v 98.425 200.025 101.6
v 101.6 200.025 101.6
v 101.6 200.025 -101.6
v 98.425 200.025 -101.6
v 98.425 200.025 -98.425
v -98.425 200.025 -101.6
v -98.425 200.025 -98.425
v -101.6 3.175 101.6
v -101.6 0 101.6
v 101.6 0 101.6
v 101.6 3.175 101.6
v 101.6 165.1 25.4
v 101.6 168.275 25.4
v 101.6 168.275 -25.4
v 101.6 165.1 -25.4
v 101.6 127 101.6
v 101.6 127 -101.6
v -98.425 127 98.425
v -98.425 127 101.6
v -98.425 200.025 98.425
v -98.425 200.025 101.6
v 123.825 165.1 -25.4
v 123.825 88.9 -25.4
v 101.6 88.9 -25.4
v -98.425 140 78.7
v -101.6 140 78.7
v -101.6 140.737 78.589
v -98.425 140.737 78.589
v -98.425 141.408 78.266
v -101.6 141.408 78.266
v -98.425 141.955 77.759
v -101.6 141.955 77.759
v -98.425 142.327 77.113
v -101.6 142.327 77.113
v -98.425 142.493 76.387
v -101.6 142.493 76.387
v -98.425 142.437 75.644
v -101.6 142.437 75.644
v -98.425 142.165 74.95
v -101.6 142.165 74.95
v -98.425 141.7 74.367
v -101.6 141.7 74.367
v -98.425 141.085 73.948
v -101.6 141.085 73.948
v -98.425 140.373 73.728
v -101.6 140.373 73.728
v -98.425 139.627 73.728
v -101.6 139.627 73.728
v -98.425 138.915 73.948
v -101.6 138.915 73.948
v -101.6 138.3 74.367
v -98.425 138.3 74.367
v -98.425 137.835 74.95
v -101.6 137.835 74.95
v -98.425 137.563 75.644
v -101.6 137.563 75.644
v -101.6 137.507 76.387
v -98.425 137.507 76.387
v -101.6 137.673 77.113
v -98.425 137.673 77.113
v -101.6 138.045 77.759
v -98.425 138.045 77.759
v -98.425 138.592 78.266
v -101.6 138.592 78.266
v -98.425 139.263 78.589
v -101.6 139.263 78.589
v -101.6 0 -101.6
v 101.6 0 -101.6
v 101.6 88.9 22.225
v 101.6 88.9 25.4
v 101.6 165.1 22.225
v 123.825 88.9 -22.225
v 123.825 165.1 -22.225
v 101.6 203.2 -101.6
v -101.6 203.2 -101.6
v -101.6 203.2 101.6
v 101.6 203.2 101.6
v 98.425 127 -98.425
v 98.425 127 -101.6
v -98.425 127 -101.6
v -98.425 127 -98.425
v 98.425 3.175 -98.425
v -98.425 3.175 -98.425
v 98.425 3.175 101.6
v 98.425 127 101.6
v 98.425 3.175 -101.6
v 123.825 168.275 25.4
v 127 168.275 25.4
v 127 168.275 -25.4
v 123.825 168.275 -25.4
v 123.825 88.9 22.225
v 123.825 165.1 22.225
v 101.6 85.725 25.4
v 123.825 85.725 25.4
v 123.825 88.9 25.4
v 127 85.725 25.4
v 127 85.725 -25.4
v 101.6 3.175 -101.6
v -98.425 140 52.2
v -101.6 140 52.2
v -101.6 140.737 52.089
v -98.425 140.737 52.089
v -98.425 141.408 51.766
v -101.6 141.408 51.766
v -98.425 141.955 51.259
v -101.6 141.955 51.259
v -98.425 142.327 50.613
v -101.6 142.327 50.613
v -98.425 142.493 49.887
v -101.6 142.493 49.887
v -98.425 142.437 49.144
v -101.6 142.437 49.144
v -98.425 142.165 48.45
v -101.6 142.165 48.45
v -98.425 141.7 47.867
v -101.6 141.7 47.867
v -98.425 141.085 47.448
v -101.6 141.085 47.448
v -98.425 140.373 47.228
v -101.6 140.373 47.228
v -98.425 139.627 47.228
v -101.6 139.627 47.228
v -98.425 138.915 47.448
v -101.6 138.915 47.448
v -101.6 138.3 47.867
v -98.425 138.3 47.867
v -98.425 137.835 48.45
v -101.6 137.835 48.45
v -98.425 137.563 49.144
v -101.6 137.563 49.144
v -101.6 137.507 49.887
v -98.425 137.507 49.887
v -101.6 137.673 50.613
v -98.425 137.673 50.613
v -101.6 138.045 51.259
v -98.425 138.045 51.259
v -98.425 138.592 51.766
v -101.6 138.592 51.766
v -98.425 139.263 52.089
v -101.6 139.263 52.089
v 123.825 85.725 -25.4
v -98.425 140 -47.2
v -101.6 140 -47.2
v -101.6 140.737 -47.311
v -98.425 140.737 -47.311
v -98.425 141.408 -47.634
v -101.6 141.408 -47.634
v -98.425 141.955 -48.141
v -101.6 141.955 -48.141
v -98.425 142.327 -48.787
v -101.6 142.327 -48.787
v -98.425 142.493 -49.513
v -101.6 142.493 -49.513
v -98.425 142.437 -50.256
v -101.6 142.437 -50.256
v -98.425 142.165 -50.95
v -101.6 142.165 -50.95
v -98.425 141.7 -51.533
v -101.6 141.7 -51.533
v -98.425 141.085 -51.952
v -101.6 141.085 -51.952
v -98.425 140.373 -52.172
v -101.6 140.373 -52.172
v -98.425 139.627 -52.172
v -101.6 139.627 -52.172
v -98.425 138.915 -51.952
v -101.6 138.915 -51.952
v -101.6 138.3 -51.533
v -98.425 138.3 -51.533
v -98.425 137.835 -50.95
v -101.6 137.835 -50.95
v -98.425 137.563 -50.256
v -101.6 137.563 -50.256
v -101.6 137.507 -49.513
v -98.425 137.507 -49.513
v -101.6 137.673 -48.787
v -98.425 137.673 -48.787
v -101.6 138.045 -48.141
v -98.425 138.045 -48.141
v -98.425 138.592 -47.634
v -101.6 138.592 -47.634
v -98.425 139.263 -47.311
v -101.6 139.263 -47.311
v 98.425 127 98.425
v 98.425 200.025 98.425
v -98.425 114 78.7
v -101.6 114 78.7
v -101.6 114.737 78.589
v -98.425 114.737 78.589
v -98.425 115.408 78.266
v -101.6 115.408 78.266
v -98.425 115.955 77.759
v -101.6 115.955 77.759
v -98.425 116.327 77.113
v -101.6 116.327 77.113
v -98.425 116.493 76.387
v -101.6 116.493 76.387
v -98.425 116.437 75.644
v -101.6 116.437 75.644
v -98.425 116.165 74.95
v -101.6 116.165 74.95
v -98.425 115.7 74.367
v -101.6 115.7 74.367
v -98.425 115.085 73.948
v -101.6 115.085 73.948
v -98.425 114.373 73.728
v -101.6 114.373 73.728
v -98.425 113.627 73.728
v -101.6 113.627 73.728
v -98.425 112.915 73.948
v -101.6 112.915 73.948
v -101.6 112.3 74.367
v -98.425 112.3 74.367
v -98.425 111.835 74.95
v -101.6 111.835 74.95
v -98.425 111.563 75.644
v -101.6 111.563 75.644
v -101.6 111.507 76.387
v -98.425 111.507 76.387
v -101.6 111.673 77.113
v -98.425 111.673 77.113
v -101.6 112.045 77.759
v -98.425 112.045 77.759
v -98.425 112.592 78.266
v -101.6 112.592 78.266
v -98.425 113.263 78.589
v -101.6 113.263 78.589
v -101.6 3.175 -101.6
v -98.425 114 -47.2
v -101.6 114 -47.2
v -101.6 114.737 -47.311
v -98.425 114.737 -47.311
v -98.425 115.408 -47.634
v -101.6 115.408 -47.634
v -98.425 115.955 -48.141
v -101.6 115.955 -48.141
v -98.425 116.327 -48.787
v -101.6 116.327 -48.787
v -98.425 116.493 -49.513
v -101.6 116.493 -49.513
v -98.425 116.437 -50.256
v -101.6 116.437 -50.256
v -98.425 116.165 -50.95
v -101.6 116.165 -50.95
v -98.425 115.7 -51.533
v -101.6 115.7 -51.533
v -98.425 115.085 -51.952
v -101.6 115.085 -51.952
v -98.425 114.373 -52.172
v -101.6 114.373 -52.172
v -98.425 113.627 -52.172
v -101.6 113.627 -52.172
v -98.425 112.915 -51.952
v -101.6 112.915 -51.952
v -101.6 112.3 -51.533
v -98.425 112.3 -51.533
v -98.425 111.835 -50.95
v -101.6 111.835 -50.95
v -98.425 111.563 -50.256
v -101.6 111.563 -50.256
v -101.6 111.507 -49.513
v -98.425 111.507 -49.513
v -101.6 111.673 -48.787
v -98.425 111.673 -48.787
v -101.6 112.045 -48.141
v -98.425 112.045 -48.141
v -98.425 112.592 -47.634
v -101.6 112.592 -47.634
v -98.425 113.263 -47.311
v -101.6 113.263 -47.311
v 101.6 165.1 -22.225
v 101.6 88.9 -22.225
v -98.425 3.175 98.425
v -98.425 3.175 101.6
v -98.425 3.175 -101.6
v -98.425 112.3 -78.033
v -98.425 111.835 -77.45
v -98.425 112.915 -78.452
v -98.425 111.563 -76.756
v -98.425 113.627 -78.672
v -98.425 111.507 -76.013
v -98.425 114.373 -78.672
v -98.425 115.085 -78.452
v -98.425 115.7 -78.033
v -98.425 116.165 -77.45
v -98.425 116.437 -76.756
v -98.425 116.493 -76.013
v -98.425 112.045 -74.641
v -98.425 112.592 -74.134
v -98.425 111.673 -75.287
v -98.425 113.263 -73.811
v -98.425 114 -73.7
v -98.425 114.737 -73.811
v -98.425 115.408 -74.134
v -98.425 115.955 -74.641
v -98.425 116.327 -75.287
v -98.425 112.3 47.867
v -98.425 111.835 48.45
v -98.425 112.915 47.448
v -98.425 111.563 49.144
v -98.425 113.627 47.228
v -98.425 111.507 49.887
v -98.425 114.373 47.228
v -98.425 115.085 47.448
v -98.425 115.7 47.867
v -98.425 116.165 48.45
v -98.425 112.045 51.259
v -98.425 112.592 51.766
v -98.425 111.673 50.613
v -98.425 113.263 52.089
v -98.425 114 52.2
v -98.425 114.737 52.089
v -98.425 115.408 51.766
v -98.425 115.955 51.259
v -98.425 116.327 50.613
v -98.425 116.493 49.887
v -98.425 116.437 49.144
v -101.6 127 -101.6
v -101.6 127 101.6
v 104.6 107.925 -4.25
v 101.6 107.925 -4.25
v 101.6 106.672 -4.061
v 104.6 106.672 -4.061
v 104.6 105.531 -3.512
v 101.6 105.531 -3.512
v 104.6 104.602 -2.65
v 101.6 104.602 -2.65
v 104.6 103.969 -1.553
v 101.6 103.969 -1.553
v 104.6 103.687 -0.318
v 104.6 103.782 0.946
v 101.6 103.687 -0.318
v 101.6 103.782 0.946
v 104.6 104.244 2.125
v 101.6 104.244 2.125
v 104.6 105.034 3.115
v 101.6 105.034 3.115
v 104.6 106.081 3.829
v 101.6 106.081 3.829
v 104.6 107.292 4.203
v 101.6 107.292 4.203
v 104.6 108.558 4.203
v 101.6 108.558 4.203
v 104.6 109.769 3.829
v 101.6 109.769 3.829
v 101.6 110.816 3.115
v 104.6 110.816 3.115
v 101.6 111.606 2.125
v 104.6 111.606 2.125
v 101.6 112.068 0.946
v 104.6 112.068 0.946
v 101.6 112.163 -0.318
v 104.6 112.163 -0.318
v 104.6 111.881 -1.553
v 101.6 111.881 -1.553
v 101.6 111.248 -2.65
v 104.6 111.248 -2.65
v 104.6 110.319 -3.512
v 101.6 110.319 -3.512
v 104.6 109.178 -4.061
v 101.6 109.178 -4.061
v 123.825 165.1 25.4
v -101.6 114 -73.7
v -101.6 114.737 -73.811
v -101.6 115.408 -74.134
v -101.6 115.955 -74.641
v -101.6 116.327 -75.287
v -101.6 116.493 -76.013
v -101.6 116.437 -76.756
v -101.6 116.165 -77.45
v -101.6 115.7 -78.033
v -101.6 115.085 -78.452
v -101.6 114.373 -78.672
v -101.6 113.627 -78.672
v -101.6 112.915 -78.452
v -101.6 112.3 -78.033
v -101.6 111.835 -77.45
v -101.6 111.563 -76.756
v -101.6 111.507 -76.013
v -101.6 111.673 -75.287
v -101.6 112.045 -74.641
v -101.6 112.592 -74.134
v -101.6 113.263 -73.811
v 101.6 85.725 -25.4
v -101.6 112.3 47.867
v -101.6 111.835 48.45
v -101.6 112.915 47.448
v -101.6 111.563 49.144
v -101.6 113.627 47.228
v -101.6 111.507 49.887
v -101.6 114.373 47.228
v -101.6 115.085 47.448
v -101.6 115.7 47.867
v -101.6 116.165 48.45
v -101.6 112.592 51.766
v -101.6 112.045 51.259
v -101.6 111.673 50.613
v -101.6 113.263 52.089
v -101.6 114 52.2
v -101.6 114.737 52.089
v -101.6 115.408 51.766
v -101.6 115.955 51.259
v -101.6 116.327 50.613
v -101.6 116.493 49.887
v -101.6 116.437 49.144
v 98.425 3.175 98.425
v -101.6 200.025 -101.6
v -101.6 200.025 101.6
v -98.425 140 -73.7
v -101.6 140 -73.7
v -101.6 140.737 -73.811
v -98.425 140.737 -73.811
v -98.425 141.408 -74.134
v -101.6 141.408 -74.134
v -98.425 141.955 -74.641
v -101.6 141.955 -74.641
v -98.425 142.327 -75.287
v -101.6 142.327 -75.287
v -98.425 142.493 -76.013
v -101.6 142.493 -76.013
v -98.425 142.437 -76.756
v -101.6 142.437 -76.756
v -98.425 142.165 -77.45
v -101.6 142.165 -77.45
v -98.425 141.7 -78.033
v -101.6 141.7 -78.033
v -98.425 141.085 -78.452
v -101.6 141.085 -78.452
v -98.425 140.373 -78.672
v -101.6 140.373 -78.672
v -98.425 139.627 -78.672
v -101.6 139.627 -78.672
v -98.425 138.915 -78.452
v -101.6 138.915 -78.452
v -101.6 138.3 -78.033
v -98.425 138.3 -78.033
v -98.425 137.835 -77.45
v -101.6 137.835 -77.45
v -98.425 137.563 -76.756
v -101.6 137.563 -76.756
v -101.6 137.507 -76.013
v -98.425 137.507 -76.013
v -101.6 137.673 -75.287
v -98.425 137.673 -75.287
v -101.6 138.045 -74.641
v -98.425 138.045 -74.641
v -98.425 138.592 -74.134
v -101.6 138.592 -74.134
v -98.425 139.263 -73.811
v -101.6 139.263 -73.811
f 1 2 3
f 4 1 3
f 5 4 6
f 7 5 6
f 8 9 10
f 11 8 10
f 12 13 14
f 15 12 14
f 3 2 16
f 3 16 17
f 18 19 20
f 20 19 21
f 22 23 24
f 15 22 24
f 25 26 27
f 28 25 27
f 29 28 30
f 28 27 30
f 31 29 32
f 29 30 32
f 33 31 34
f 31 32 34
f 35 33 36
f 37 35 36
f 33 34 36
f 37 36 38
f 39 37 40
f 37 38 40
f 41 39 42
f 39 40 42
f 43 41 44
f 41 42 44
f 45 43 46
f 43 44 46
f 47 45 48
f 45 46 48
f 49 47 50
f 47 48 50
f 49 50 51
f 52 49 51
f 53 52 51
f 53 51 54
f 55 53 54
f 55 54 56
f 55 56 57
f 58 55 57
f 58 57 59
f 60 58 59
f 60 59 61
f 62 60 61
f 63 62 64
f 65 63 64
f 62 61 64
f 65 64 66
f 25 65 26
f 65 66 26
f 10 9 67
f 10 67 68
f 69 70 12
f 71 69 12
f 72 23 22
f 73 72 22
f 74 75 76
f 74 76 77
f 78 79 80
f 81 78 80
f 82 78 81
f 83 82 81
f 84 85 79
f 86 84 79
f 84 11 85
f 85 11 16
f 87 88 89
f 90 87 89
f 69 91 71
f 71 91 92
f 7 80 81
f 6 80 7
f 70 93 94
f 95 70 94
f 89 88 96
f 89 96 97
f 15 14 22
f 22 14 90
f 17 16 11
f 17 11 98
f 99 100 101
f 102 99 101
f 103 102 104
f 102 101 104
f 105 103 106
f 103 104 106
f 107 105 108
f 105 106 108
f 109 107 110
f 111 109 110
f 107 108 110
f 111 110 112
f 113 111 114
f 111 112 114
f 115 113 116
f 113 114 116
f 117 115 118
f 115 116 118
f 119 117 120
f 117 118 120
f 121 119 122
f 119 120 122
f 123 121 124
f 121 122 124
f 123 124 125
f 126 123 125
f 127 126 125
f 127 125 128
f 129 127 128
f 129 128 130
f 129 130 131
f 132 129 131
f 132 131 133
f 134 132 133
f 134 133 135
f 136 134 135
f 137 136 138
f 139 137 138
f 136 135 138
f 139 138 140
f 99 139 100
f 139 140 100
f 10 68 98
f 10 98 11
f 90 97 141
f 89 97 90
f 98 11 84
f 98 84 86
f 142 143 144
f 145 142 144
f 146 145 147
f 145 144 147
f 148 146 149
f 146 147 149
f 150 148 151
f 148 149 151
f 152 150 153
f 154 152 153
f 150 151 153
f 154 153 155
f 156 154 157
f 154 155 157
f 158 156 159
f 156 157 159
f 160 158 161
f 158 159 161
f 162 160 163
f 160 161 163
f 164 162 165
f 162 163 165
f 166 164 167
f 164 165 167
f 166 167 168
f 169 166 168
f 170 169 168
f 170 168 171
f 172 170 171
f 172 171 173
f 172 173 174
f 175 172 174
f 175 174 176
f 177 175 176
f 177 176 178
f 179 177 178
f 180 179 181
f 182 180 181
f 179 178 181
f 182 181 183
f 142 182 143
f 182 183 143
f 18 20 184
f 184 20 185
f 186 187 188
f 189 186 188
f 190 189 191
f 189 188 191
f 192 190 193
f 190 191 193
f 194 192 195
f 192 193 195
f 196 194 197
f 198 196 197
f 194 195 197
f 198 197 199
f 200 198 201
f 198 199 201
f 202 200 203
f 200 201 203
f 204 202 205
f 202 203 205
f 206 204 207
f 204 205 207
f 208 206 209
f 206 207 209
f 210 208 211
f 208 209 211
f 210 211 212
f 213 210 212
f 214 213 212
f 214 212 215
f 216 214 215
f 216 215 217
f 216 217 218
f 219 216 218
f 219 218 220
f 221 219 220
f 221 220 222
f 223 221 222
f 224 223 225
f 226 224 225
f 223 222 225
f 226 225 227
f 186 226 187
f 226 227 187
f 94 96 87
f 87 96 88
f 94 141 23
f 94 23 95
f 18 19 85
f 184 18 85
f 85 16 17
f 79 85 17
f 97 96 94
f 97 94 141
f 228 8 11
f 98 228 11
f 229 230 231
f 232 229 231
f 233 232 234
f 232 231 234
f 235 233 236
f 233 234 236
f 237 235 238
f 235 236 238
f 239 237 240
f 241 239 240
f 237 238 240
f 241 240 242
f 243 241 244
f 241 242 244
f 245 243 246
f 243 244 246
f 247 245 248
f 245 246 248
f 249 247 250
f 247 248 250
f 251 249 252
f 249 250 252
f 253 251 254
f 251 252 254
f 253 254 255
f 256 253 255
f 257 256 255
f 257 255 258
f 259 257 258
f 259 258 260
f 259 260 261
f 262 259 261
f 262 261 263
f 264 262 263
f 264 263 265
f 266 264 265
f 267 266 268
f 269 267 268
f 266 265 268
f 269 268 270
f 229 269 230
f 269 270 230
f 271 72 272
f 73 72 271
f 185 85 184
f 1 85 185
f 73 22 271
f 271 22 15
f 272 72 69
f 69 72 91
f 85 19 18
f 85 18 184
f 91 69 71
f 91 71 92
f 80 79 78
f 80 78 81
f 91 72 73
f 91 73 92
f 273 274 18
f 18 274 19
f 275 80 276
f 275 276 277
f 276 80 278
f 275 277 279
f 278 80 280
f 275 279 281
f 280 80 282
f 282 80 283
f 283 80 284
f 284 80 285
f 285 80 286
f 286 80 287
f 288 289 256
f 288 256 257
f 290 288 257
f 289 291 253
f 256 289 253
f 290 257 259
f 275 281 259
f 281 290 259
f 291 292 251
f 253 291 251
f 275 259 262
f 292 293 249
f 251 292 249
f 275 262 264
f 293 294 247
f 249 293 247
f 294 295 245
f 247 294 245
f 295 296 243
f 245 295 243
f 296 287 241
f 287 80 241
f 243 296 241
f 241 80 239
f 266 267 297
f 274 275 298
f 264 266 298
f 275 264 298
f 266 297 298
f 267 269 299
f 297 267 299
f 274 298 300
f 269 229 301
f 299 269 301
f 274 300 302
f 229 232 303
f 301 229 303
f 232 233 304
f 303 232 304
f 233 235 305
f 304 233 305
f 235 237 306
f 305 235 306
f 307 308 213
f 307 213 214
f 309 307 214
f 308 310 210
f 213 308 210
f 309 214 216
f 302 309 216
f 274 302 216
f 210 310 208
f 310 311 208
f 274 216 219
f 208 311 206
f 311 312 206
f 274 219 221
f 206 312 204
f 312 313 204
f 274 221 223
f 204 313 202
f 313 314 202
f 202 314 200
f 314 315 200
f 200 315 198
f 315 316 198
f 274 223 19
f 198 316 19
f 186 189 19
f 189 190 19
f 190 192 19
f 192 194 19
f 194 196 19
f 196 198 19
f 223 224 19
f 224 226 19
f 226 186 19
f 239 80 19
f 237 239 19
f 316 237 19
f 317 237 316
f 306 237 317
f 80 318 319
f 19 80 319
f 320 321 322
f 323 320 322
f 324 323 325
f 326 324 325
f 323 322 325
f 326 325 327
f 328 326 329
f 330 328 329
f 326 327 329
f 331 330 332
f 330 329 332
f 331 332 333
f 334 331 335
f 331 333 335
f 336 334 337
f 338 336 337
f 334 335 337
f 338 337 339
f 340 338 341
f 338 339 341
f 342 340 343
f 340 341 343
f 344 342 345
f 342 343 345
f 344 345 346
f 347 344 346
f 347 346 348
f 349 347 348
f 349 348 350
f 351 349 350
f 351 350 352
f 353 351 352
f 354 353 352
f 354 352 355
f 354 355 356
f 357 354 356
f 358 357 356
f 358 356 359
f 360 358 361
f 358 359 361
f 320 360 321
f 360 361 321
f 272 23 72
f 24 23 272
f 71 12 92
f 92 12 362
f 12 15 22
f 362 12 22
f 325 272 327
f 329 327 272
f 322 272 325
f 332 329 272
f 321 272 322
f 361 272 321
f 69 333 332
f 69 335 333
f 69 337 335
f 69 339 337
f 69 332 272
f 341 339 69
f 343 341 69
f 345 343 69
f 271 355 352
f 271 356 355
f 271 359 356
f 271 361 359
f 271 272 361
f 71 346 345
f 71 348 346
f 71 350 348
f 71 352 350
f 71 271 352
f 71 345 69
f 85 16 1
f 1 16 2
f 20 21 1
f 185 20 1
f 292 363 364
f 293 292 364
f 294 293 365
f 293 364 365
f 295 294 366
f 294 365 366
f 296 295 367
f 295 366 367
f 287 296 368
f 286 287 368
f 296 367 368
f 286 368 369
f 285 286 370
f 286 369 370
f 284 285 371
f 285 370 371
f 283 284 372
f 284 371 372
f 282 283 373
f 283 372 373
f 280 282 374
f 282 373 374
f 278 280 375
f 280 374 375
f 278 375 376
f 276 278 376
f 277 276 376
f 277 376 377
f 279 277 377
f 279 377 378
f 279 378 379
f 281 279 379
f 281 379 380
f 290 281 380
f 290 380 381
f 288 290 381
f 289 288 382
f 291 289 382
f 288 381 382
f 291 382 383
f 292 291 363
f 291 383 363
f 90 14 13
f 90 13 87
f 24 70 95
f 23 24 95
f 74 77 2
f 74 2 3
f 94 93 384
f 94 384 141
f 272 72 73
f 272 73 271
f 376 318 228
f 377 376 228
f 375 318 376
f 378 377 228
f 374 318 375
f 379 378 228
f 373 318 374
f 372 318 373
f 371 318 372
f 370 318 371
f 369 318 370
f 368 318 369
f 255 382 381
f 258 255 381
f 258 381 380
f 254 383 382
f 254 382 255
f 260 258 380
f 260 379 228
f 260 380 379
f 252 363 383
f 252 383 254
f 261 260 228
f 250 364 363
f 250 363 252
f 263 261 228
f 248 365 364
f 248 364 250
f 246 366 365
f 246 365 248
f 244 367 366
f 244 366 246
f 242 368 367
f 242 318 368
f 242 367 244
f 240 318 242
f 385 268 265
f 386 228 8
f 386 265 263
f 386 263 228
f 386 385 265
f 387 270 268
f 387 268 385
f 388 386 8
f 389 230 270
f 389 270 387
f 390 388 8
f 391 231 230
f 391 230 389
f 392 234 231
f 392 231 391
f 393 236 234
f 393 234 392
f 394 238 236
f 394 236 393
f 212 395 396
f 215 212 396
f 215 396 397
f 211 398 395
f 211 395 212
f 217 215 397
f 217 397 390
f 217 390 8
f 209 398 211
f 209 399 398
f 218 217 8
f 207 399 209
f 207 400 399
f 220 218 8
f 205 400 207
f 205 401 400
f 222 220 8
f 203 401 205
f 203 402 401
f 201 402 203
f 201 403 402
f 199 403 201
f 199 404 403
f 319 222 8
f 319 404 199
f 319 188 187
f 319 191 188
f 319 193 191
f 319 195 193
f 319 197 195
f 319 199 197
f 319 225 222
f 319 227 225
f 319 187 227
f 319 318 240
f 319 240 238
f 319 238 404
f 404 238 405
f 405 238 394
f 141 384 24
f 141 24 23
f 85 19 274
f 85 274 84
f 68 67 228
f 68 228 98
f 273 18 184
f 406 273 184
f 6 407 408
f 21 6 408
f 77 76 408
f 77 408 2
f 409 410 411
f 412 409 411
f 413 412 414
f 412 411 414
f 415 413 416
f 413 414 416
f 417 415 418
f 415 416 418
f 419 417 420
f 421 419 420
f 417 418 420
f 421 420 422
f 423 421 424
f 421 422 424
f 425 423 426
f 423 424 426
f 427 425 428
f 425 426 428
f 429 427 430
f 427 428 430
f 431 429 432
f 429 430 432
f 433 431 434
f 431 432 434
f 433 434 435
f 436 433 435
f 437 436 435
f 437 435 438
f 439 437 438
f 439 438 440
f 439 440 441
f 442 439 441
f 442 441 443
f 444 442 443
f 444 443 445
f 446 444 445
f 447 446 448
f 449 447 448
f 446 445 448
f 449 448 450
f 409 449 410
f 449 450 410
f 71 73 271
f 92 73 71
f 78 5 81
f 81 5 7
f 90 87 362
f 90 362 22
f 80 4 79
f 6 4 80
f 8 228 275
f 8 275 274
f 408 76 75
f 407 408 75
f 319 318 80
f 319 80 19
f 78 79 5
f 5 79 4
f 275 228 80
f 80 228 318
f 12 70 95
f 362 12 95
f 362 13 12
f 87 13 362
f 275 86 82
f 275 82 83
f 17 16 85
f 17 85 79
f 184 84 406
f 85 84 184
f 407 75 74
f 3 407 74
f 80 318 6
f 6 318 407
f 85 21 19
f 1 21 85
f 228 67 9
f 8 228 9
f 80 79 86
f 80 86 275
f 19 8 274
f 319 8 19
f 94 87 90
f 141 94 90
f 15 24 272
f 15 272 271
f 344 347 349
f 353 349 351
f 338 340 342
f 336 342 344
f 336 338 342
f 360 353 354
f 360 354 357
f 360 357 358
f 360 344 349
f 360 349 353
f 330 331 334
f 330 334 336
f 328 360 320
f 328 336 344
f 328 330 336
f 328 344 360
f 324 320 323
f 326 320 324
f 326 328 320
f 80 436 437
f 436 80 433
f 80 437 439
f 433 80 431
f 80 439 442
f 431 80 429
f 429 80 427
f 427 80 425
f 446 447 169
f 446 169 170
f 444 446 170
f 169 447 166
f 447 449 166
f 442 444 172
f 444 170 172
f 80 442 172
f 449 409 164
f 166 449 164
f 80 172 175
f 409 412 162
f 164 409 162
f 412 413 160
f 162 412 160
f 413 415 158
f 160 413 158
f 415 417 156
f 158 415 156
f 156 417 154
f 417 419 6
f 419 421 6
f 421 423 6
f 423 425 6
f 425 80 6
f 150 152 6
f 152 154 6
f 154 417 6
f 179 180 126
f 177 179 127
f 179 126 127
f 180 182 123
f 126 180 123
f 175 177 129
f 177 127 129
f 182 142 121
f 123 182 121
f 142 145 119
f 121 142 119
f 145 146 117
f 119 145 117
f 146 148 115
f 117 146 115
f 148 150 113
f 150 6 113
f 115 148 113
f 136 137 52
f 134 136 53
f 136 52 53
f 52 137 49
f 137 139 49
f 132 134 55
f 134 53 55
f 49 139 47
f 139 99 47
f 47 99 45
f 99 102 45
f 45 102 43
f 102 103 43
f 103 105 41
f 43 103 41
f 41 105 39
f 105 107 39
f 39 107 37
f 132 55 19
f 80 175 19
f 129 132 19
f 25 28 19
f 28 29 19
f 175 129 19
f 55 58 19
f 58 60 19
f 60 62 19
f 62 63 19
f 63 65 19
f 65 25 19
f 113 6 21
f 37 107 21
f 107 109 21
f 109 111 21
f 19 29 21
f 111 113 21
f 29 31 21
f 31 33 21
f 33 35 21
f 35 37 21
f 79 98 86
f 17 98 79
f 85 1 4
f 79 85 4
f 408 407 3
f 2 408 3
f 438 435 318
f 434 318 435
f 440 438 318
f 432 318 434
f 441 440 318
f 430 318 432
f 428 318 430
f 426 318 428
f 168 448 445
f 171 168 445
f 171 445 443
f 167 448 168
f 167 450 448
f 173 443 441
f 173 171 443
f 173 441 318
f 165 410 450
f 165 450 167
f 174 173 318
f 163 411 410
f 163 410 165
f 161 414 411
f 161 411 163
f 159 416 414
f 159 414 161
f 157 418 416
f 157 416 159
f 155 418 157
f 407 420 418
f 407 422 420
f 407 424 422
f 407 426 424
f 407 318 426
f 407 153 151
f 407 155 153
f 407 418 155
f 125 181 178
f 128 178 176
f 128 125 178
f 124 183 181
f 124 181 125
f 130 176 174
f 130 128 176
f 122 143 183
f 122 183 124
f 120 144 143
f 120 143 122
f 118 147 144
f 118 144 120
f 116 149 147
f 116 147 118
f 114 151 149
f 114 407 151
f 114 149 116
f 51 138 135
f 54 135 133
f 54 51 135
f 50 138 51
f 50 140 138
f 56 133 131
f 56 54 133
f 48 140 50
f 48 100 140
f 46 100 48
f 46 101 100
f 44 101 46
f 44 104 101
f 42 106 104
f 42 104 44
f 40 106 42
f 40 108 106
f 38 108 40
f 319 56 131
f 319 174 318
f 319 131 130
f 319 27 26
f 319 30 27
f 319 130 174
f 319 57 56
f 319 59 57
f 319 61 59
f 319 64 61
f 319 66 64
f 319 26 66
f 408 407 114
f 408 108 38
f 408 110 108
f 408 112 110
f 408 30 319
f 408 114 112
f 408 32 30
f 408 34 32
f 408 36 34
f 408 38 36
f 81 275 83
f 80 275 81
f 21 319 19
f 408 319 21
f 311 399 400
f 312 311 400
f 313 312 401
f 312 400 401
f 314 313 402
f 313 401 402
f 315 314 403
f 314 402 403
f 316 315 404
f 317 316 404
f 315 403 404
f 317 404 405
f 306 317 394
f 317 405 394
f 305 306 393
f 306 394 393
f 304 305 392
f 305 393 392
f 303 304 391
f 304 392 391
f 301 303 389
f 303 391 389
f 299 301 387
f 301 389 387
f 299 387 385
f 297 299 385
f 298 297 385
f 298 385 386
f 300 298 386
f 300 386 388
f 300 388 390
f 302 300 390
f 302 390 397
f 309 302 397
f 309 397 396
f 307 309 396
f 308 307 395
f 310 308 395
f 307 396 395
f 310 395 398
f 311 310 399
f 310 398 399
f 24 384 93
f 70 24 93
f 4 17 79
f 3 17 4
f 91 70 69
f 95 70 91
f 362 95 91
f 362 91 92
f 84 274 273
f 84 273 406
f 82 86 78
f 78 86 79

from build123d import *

# Parameters (mm, degrees)
SKETCH1_W            = 203.2
SKETCH1_H            = 203.2
BOSS_EXTRUDE1_DEPTH  = 127
SKETCH2_W            = 190.5
SKETCH2_H            = 190.5
CUT_EXTRUDE1_DEPTH   = 120.65
SKETCH3_W            = 203.2
SKETCH3_H            = 203.2
BOSS_EXTRUDE2_DEPTH  = 76.2
CUT_EXTRUDE2_START   = -6.35
SKETCH5_W            = 190.5
SKETCH5_H            = 190.5
CUT_EXTRUDE2_DEPTH   = 69.85
BOSS_EXTRUDE3_START  = 101.6
SKETCH6_W            = 50.8
SKETCH6_H            = 82.55
BOSS_EXTRUDE3_DEPTH  = 25.4
SKETCH7_R            = 2.499999953
CUT_EXTRUDE3_DEPTH   = 6.35
SKETCH9_W            = 38.1
SKETCH9_H            = 69.85
CUT_EXTRUDE4_DEPTH   = 19.05
BOSS_EXTRUDE4_START  = -3.175
SKETCH10_W           = 44.45
SKETCH10_H           = 76.2
BOSS_EXTRUDE4_DEPTH  = 22.225
SKETCH15_W           = 50.8
SKETCH15_H           = 82.55
BOSS_EXTRUDE5_DEPTH  = 3.175
SKETCH16_W           = 22.225
SKETCH16_H           = 50.8
BOSS_EXTRUDE7_DEPTH  = 3.175
SKETCH18_W           = 22.225
SKETCH18_H           = 50.8
BOSS_EXTRUDE8_DEPTH  = 3.175
SKETCH13_R           = 4.25
CUT_EXTRUDE6_DEPTH   = 3
SKETCH21_W           = 22.225
SKETCH21_H           = 76.2
BOSS_EXTRUDE13_DEPTH = 3.175
SKETCH22_W           = 203.2
SKETCH22_H           = 203.2
BOSS_EXTRUDE14_DEPTH = 3.175
SKETCH23_W           = 203.2
SKETCH23_H           = 73.025
BOSS_EXTRUDE16_DEPTH = 3.175
SKETCH24_W           = 203.2
SKETCH24_H           = 73.025
SKETCH24_R           = 2.499999953
BOSS_EXTRUDE17_DEPTH = 3.175
SKETCH25_W           = 196.85
SKETCH25_H           = 73.025
BOSS_EXTRUDE18_DEPTH = 3.175
SKETCH26_W           = 196.85
SKETCH26_H           = 73.025
BOSS_EXTRUDE19_DEPTH = 3.175
SKETCH27_W           = 203.2
SKETCH27_H           = 203.2
BOSS_EXTRUDE20_DEPTH = 3.175
SKETCH28_W           = 203.2
SKETCH28_H           = 123.825
BOSS_EXTRUDE21_DEPTH = 3.175
SKETCH29_W           = 203.2
SKETCH29_H           = 123.825
SKETCH29_R           = 2.499999953
BOSS_EXTRUDE22_DEPTH = 3.175
SKETCH30_W           = 196.85
SKETCH30_H           = 123.825
BOSS_EXTRUDE23_DEPTH = 3.175
SKETCH31_W           = 196.85
SKETCH31_H           = 123.825
BOSS_EXTRUDE24_DEPTH = 3.175
SKETCH19_W           = 22.225
SKETCH19_H           = 76.2
BOSS_EXTRUDE26_DEPTH = 3.175


with BuildPart() as part:
    # Sketch1 → Boss-Extrude1 (new body)
    with BuildSketch(Plane(origin=(0, 0, 0), x_dir=(1, 0, 0), z_dir=(0, 1, 0))):
        Rectangle(SKETCH1_W, SKETCH1_H)
    extrude(amount=BOSS_EXTRUDE1_DEPTH)

    # Sketch2 → Cut-Extrude1 (cut)
    with BuildSketch(Plane(origin=(0, 127, 0), x_dir=(1, 0, 0), z_dir=(0, 1, 0))):
        Rectangle(SKETCH2_W, SKETCH2_H)
    extrude(amount=-CUT_EXTRUDE1_DEPTH, mode=Mode.SUBTRACT)


with BuildPart() as body_2:
    # Sketch3 → Boss-Extrude2 (new body)
    with BuildSketch(Plane(origin=(0, 127, 0), x_dir=(1, 0, 0), z_dir=(0, 1, 0))):
        Rectangle(SKETCH3_W, SKETCH3_H)
    extrude(amount=BOSS_EXTRUDE2_DEPTH)

    # Sketch5 → Cut-Extrude2 (cut)
    with BuildSketch(Plane(origin=(0, 203.2, 0), x_dir=(1, 0, 0), z_dir=(0, 1, 0)).offset(CUT_EXTRUDE2_START)):
        Rectangle(SKETCH5_W, SKETCH5_H)
    extrude(amount=-CUT_EXTRUDE2_DEPTH, mode=Mode.SUBTRACT)

    # Sketch7 → Cut-Extrude3 (cut)
    with BuildSketch(Plane.ZY.offset(101.6)):
        with Locations((-76.2, 139.999999908)):
            Circle(SKETCH7_R)
        with Locations((-49.699999914, 139.999999908)):
            Circle(SKETCH7_R)
        with Locations((49.699999914, 139.999999908)):
            Circle(SKETCH7_R)
        with Locations((76.2, 139.999999908)):
            Circle(SKETCH7_R)
    cut_extrude3 = extrude(amount=-CUT_EXTRUDE3_DEPTH, mode=Mode.SUBTRACT)


with BuildPart() as body_3:
    # Sketch6 → Boss-Extrude3 (new body)
    with BuildSketch(Plane(origin=(0, 0, 0), x_dir=(0, 0, -1), z_dir=(1, 0, 0)).offset(BOSS_EXTRUDE3_START)):
        with Locations((0, 127)):
            Rectangle(SKETCH6_W, SKETCH6_H)
    extrude(amount=BOSS_EXTRUDE3_DEPTH)

    # Sketch9 → Cut-Extrude4 (cut)
    with BuildSketch(Plane.ZY.offset(-101.6)):
        with Locations((0, 127)):
            Rectangle(SKETCH9_W, SKETCH9_H)
    extrude(amount=-CUT_EXTRUDE4_DEPTH, mode=Mode.SUBTRACT)


with BuildPart() as part_1:
    add(part.part)

    # Mirror4: Cut-Extrude3 across plane
    add(cut_extrude3.mirror(Plane(origin=(0, 127, 0), x_dir=(0, 0, 1), z_dir=(0, -1, 0))), mode=Mode.SUBTRACT)


with BuildPart() as body_4:
    # Sketch10 → Boss-Extrude4 (new body)
    with BuildSketch(Plane.ZY.offset(-120.65).offset(BOSS_EXTRUDE4_START)):
        with Locations((0, 127)):
            Rectangle(SKETCH10_W, SKETCH10_H)
    extrude(amount=BOSS_EXTRUDE4_DEPTH)

    # Sketch13 → Cut-Extrude6 (cut)
    with BuildSketch(Plane.ZY.offset(-101.6)):
        with Locations(Location((0, 107.925, 0), (0, 0, 180))):
            Circle(SKETCH13_R)
    extrude(amount=-CUT_EXTRUDE6_DEPTH, mode=Mode.SUBTRACT)


with BuildPart() as body_5:
    # Sketch15 → Boss-Extrude5 (new body)
    with BuildSketch(Plane(origin=(127, 0, 0), x_dir=(0, 0, -1), z_dir=(1, 0, 0))):
        with Locations((0, 127)):
            Rectangle(SKETCH15_W, SKETCH15_H)
    extrude(amount=-BOSS_EXTRUDE5_DEPTH)


with BuildPart() as body_6:
    # Sketch16 → Boss-Extrude7 (new body)
    with BuildSketch(Plane(origin=(0, 168.275, 0), x_dir=(1, 0, 0), z_dir=(0, 1, 0))):
        with Locations((112.7125, 0)):
            Rectangle(SKETCH16_W, SKETCH16_H)
    extrude(amount=-BOSS_EXTRUDE7_DEPTH)


with BuildPart() as body_7:
    # Sketch18 → Boss-Extrude8 (new body)
    with BuildSketch(Plane.XZ.offset(-85.725)):
        with Locations((112.7125, 0)):
            Rectangle(SKETCH18_W, SKETCH18_H)
    extrude(amount=-BOSS_EXTRUDE8_DEPTH)


with BuildPart() as body_8:
    # Sketch21 → Boss-Extrude13 (new body)
    with BuildSketch(Plane(origin=(0, 0, -25.4), x_dir=(-1, 0, 0), z_dir=(0, 0, -1))):
        with Locations((-112.7125, 127)):
            Rectangle(SKETCH21_W, SKETCH21_H)
    extrude(amount=-BOSS_EXTRUDE13_DEPTH)


with BuildPart() as body_8_2:
    # Sketch22 → Boss-Extrude14 (new body)
    with BuildSketch(Plane(origin=(0, 203.2, 0), x_dir=(1, 0, 0), z_dir=(0, 1, 0))):
        Rectangle(SKETCH22_W, SKETCH22_H)
    extrude(amount=-BOSS_EXTRUDE14_DEPTH)


with BuildPart() as body_9:
    # Sketch23 → Boss-Extrude16 (new body)
    with BuildSketch(Plane(origin=(101.6, 0, 0), x_dir=(0, 0, -1), z_dir=(1, 0, 0))):
        with Locations((0, 163.5125)):
            Rectangle(SKETCH23_W, SKETCH23_H)
    extrude(amount=-BOSS_EXTRUDE16_DEPTH)


with BuildPart() as body_10:
    # Sketch24 → Boss-Extrude17 (new body)
    with BuildSketch(Plane.ZY.offset(101.6)):
        with Locations((0, 163.5125)):
            Rectangle(SKETCH24_W, SKETCH24_H)
        with Locations((76.2, 139.999999908)):
            Circle(SKETCH24_R, mode=Mode.SUBTRACT)
        with Locations((49.699999914, 139.999999908)):
            Circle(SKETCH24_R, mode=Mode.SUBTRACT)
        with Locations((-49.699999914, 139.999999908)):
            Circle(SKETCH24_R, mode=Mode.SUBTRACT)
        with Locations((-76.2, 139.999999908)):
            Circle(SKETCH24_R, mode=Mode.SUBTRACT)
    extrude(amount=-BOSS_EXTRUDE17_DEPTH)


with BuildPart() as body_11:
    # Sketch25 → Boss-Extrude18 (new body)
    with BuildSketch(Plane.XY.offset(101.6)):
        with Locations((0, 163.5125)):
            Rectangle(SKETCH25_W, SKETCH25_H)
    extrude(amount=-BOSS_EXTRUDE18_DEPTH)


with BuildPart() as body_12:
    # Sketch26 → Boss-Extrude19 (new body)
    with BuildSketch(Plane(origin=(0, 0, -101.6), x_dir=(-1, 0, 0), z_dir=(0, 0, -1))):
        with Locations((0, 163.5125)):
            Rectangle(SKETCH26_W, SKETCH26_H)
    extrude(amount=-BOSS_EXTRUDE19_DEPTH)


with BuildPart() as body_12_2:
    # Sketch27 → Boss-Extrude20 (new body)
    with BuildSketch(Plane.XZ):
        Rectangle(SKETCH27_W, SKETCH27_H)
    extrude(amount=-BOSS_EXTRUDE20_DEPTH)


with BuildPart() as body_13:
    # Sketch28 → Boss-Extrude21 (new body)
    with BuildSketch(Plane(origin=(101.6, 0, 0), x_dir=(0, 0, -1), z_dir=(1, 0, 0))):
        with Locations((0, 65.0875)):
            Rectangle(SKETCH28_W, SKETCH28_H)
    extrude(amount=-BOSS_EXTRUDE21_DEPTH)


with BuildPart() as body_14:
    # Sketch29 → Boss-Extrude22 (new body)
    with BuildSketch(Plane.ZY.offset(101.6)):
        with Locations((0, 65.0875)):
            Rectangle(SKETCH29_W, SKETCH29_H)
        with Locations((76.2, 114.000000092)):
            Circle(SKETCH29_R, mode=Mode.SUBTRACT)
        with Locations((49.699999914, 114.000000092)):
            Circle(SKETCH29_R, mode=Mode.SUBTRACT)
        with Locations((-49.699999914, 114.000000092)):
            Circle(SKETCH29_R, mode=Mode.SUBTRACT)
        with Locations((-76.2, 114.000000092)):
            Circle(SKETCH29_R, mode=Mode.SUBTRACT)
    extrude(amount=-BOSS_EXTRUDE22_DEPTH)


with BuildPart() as body_15:
    # Sketch30 → Boss-Extrude23 (new body)
    with BuildSketch(Plane.XY.offset(101.6)):
        with Locations((0, 65.0875)):
            Rectangle(SKETCH30_W, SKETCH30_H)
    extrude(amount=-BOSS_EXTRUDE23_DEPTH)


with BuildPart() as body_16:
    # Sketch31 → Boss-Extrude24 (new body)
    with BuildSketch(Plane(origin=(0, 0, -101.6), x_dir=(-1, 0, 0), z_dir=(0, 0, -1))):
        with Locations((0, 65.0875)):
            Rectangle(SKETCH31_W, SKETCH31_H)
    extrude(amount=-BOSS_EXTRUDE24_DEPTH)


with BuildPart() as body_16_2:
    # Sketch19 → Boss-Extrude26 (new body)
    with BuildSketch(Plane.XY.offset(25.4)):
        with Locations((112.7125, 127)):
            Rectangle(SKETCH19_W, SKETCH19_H)
    extrude(amount=-BOSS_EXTRUDE26_DEPTH)


solid = Compound([body_4.part, body_5.part, body_6.part, body_7.part, body_8.part, body_8_2.part, body_9.part, body_10.part, body_11.part, body_12.part, body_12_2.part, body_13.part, body_14.part, body_15.part, body_16.part, body_16_2.part])
